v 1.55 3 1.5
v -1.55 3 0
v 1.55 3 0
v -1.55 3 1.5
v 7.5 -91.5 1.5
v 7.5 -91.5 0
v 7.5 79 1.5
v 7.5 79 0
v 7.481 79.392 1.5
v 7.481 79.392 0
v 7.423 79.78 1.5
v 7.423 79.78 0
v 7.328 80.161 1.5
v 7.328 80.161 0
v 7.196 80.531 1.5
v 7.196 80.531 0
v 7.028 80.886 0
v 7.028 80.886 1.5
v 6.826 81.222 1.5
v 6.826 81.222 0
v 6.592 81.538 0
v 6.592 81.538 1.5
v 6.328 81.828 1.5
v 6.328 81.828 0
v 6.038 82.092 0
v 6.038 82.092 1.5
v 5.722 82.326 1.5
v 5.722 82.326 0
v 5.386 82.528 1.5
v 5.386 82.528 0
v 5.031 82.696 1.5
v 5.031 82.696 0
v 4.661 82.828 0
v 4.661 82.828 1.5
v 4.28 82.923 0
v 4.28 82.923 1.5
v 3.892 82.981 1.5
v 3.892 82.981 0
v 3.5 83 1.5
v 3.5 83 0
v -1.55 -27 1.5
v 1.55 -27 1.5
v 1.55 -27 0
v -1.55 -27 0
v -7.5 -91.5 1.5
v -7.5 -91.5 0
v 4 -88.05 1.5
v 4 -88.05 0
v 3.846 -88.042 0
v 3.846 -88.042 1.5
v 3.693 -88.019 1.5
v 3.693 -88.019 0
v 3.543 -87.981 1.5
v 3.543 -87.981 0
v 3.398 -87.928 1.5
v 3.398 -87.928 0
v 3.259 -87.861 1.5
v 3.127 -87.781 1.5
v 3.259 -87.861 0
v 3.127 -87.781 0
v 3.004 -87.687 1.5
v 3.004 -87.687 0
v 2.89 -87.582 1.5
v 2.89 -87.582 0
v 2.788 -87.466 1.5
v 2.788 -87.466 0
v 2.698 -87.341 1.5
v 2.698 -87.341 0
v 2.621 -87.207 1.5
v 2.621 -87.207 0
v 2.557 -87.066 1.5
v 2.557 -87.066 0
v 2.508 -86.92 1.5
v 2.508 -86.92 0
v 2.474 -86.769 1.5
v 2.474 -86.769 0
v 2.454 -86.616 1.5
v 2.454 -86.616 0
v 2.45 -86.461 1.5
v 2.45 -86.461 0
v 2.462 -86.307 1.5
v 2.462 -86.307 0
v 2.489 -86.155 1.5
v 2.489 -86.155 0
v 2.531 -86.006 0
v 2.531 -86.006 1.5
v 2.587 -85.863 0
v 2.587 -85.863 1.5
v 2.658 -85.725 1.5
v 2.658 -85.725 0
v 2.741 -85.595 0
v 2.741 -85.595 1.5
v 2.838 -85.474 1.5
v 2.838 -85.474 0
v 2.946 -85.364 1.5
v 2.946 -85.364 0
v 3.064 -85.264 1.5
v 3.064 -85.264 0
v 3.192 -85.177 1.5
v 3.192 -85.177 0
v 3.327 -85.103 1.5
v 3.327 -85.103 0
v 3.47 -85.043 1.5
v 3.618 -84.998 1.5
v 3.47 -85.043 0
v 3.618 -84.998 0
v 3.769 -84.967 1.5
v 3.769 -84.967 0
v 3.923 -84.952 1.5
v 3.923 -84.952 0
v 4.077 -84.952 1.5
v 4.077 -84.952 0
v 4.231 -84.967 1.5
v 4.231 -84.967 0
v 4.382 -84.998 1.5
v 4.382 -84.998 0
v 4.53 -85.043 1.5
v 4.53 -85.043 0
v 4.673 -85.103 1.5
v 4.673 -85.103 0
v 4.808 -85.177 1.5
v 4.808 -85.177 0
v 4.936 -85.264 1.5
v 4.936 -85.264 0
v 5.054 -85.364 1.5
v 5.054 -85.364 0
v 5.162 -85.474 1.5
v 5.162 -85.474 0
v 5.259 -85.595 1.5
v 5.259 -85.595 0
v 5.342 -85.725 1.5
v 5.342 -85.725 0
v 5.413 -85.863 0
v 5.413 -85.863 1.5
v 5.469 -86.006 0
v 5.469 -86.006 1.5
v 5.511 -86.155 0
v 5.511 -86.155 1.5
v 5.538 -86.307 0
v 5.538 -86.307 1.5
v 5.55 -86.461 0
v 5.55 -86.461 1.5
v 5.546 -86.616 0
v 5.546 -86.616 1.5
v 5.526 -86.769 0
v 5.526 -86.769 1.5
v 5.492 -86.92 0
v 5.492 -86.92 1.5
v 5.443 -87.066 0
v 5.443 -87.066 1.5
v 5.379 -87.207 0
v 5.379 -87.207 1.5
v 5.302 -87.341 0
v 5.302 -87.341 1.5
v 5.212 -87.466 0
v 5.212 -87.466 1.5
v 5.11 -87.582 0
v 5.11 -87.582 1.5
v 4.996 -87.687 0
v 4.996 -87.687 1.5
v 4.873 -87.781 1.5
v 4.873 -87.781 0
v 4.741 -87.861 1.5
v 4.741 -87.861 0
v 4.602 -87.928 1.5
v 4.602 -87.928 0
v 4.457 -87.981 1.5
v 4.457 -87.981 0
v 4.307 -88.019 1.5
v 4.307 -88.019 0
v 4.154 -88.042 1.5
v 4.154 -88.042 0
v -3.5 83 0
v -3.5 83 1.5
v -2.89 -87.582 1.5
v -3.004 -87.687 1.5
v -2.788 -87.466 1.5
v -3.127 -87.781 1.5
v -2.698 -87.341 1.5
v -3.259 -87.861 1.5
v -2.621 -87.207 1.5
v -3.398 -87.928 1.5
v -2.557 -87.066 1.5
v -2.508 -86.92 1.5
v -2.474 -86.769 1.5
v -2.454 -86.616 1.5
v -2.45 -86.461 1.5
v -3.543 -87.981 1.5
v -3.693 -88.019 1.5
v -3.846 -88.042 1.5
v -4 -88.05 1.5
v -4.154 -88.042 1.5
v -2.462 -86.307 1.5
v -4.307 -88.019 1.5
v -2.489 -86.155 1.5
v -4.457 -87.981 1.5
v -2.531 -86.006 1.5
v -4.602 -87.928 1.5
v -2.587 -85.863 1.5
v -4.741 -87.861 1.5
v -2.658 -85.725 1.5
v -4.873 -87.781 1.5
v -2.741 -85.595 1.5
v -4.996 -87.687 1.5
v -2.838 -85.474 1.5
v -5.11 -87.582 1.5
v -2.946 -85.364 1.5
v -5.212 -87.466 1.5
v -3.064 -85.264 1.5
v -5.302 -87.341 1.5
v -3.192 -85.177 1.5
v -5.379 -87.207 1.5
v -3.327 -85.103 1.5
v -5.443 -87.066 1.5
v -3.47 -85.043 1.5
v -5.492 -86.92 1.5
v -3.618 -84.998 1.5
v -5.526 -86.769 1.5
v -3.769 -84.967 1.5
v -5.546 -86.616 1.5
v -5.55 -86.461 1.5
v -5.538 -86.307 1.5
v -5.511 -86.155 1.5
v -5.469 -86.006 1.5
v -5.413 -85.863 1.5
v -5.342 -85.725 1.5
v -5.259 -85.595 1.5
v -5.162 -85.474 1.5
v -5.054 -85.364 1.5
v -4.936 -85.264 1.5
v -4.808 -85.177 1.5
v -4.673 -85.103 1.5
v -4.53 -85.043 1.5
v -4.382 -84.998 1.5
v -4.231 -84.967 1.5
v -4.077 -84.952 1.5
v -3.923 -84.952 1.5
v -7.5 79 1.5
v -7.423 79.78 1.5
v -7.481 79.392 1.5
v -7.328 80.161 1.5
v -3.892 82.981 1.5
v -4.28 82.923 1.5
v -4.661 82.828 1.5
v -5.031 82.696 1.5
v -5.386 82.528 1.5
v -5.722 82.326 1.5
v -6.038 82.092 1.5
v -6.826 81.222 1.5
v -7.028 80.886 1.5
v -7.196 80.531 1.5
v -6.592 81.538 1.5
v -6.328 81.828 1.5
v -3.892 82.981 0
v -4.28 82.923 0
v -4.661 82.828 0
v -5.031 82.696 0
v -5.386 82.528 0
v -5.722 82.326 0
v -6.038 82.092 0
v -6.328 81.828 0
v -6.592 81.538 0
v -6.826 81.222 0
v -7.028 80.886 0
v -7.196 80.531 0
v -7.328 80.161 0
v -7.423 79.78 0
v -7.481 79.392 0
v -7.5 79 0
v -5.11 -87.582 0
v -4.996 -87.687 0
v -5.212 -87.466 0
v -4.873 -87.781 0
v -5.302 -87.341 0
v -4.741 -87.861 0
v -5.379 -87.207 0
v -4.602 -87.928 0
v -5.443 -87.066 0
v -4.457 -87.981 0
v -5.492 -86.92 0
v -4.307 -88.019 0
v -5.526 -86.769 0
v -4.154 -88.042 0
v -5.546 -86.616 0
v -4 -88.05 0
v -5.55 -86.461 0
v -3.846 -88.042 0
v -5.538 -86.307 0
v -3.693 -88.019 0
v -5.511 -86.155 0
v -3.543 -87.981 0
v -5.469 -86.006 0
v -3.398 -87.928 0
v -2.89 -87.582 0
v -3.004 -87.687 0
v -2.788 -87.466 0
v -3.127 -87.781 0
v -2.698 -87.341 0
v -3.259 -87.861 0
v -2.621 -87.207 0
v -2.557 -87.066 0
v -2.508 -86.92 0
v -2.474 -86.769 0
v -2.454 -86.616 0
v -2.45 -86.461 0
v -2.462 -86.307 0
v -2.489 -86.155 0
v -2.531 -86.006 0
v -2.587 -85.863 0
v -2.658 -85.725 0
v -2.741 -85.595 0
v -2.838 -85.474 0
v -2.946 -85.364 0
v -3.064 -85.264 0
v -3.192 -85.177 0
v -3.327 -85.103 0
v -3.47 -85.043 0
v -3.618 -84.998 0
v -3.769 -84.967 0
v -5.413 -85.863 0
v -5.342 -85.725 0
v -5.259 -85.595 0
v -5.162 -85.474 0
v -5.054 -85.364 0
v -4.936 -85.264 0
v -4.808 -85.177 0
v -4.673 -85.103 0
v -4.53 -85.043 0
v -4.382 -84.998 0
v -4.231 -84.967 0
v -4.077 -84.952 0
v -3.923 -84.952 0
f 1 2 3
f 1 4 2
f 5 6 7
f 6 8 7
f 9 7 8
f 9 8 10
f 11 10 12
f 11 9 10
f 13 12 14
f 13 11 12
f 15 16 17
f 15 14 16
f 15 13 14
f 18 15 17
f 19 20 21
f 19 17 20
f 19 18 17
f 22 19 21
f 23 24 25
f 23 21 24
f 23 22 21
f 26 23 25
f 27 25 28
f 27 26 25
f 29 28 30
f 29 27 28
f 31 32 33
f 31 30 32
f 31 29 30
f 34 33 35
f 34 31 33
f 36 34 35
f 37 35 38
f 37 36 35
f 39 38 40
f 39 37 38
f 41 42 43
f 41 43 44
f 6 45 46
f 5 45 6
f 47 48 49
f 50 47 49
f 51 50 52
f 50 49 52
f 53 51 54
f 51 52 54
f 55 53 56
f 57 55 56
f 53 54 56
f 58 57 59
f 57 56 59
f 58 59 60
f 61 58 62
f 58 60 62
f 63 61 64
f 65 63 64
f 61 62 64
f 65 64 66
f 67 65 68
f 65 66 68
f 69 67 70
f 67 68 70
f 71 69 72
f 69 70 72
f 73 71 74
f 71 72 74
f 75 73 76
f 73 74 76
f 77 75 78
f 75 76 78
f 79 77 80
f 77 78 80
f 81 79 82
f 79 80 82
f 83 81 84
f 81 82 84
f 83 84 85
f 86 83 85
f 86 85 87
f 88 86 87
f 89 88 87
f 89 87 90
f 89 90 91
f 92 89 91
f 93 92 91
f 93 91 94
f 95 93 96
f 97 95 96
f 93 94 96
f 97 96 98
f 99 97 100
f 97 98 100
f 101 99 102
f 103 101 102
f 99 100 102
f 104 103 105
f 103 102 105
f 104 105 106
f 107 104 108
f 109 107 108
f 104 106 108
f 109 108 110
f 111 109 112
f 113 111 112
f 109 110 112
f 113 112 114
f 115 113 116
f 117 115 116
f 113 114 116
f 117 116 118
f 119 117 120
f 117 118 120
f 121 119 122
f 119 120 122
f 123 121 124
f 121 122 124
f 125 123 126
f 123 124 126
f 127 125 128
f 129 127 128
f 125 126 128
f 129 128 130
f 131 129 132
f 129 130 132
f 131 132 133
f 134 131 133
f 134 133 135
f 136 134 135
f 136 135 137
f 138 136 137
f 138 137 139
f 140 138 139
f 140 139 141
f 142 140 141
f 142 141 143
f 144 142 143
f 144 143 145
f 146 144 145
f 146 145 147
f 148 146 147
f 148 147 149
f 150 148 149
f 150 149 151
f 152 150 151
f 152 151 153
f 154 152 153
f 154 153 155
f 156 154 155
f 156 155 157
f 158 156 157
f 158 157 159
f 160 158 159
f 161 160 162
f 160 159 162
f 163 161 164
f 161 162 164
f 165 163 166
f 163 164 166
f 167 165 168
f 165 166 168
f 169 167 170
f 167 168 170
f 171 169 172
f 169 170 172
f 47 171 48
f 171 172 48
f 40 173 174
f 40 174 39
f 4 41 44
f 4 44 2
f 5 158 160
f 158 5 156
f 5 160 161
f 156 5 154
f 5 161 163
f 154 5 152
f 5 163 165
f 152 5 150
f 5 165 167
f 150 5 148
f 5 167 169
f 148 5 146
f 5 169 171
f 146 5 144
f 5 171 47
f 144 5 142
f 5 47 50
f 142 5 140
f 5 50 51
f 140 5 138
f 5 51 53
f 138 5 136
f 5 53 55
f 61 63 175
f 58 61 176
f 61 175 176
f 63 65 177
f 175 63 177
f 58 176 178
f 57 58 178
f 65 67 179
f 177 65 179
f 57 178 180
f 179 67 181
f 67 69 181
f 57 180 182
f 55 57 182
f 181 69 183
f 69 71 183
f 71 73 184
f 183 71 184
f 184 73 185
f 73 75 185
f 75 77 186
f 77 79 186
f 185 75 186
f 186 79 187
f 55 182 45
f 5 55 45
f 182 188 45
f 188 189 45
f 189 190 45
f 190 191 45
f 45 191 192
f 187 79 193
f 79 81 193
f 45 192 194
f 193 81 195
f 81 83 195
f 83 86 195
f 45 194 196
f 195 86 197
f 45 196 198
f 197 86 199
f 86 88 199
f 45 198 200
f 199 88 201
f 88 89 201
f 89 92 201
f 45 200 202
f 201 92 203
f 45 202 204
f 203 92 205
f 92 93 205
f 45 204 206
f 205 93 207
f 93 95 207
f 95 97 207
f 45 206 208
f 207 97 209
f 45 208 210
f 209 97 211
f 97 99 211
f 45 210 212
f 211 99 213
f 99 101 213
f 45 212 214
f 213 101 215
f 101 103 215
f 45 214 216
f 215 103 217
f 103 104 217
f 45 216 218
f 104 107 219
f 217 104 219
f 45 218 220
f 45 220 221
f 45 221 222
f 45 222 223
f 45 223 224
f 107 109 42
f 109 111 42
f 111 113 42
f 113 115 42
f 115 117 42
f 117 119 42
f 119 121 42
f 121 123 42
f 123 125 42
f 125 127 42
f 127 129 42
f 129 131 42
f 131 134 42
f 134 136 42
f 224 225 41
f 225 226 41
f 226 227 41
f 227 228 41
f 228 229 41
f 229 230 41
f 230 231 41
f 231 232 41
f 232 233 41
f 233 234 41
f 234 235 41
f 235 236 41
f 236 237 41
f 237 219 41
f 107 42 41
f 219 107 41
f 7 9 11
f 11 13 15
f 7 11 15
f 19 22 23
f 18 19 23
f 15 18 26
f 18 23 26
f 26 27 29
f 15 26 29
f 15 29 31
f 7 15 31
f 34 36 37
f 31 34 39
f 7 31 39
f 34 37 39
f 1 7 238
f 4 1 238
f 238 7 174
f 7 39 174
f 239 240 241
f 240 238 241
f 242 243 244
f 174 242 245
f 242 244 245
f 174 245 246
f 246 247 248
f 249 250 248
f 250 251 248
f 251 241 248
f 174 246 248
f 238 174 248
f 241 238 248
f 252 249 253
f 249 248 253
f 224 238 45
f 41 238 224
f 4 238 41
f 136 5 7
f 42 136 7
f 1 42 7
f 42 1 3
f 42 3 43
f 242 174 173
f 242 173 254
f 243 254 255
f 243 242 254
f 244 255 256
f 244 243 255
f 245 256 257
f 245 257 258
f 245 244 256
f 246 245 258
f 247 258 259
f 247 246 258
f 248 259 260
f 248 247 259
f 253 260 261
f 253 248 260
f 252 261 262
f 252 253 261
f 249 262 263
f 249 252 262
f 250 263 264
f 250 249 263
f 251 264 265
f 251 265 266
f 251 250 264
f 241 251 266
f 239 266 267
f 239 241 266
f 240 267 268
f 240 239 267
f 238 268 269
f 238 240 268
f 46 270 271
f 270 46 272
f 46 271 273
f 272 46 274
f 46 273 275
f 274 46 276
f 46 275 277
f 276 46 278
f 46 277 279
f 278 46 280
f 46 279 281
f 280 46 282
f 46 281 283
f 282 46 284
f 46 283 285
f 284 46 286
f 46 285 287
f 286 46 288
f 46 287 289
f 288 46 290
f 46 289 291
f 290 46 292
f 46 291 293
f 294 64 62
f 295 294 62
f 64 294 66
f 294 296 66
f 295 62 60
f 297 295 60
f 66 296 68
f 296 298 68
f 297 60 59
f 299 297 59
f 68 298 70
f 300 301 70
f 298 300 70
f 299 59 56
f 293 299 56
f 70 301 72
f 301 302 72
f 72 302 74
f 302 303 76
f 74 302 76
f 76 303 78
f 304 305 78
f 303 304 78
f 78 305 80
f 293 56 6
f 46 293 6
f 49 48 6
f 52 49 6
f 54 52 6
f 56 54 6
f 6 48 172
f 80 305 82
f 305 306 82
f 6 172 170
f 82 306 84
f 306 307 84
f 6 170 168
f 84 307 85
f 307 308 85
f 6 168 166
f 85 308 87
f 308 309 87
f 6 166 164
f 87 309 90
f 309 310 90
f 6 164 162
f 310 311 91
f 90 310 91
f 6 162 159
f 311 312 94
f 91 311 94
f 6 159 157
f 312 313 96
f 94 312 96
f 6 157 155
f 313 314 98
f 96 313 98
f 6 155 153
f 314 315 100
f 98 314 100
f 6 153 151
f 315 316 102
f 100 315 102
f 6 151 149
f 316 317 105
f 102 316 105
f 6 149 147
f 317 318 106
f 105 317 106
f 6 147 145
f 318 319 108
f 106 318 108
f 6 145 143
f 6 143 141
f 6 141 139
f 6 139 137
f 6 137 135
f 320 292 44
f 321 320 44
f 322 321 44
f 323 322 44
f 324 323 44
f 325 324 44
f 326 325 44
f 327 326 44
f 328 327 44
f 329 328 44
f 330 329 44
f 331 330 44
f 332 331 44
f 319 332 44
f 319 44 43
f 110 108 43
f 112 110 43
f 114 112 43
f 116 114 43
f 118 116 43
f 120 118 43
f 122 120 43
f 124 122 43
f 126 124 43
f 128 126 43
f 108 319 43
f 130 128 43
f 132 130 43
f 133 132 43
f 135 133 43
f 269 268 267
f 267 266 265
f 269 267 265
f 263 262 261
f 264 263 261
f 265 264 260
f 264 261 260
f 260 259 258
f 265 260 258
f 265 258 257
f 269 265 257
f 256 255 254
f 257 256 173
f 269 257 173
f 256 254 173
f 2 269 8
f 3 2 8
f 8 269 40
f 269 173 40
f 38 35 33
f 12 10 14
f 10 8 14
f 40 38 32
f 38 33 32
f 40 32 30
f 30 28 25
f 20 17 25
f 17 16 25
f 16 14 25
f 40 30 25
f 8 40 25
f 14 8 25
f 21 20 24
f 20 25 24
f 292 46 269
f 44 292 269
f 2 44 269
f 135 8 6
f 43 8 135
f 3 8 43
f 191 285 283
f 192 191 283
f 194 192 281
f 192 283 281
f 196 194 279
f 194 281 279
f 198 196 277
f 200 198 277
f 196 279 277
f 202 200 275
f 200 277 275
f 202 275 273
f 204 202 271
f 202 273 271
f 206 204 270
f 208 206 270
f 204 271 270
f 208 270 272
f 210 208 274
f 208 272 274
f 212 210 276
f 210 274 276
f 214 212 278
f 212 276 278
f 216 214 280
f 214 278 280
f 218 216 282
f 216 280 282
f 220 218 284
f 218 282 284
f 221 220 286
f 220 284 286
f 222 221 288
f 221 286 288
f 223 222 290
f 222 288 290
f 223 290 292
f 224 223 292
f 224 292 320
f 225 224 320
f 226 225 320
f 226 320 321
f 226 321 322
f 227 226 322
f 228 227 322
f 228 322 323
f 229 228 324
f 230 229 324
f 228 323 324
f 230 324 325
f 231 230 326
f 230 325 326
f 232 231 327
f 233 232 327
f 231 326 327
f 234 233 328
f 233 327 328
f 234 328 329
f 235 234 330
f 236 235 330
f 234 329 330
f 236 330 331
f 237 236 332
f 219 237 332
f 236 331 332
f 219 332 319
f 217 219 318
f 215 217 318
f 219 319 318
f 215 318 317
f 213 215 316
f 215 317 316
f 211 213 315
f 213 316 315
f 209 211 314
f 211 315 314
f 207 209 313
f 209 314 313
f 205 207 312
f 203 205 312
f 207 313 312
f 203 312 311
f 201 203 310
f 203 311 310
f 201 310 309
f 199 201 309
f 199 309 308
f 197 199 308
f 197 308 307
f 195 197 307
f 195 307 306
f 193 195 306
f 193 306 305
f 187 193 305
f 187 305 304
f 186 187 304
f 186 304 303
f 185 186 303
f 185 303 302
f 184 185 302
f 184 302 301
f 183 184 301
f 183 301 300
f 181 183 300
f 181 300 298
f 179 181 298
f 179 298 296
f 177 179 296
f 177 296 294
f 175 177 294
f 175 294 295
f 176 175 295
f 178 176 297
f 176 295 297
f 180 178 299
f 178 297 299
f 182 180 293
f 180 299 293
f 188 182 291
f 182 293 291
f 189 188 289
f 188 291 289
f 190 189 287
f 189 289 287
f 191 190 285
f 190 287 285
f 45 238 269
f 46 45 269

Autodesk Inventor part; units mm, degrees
ref_plane "YZ Plane" through (0, 0, 0) normal (1, 0, 0) x (0, 1, 0)
ref_plane "XZ Plane" through (0, 0, 0) normal (0, 1, 0) x (-1, 0, 0)
ref_plane "XY Plane" through (0, 0, 0) normal (0, 0, 1) x (1, 0, 0)
sketch "スケッチ1" plane through (0, 0, 0) normal (0, 0, 1) x (1, 0, 0)
  line L0 (-7.5, 83) -> (7.5, 83)
  line L1 (7.5, 83) -> (7.5, -83)
  line L2 (7.5, -83) -> (-7.5, -83)
  line L3 (-7.5, -83) -> (-7.5, 83)
  line L4 (-7.5, 83) -> (7.5, -83) construction
  line L5 (7.5, 83) -> (-7.5, -83) construction
  point P0 (0, 0)
  dimension "d0" = 15
  dimension "d1" = 166
extrude "押し出し1" add sketch "スケッチ1" along normal blind 1.5
sketch "スケッチ2" plane through (0, 0, 1.5) normal (0, 0, 1) x (1, 0, 0)
  line L0 (7.5, 83) -> (-7.5, 83) projected
  line L1 (-1.55, 3) -> (1.55, 3)
  line L2 (1.55, 3) -> (1.55, -27)
  line L3 (1.55, -27) -> (-1.55, -27)
  line L4 (-1.55, -27) -> (-1.55, 3)
  line L5 (-7.5, 83) -> (-7.5, -83) projected
  point P0 (0, 0)
  dimension "d6" = 3.1
  dimension "d7" = 30
  dimension "d8" = 80
  dimension "d9" = 5.95
extrude "押し出し2" cut sketch "スケッチ2" against normal blind 1.5
fillet "フィレット1" radius 4 2 edges at (-7.5, 83, 0.75) (7.5, 83, 0.75)
sketch "スケッチ5" plane through (-7.5, -83, 0) normal (0, -1, 0) x (1, 0, 0)
  line L0 (0, 0) -> (15, 0)
  line L1 (15, 0) -> (15, 1.5)
  line L2 (15, 1.5) -> (0, 1.5)
  line L3 (0, 1.5) -> (0, 0)
  point P0 (7.5, 0)
extrude "押し出し4" add sketch "スケッチ5" along normal blind 8.5
sketch "スケッチ6" plane through (0, 0, 1.5) normal (0, 0, 1) x (1, 0, 0)
  line L0 (7.5, -91.5) -> (-7.5, -91.5) projected
  line L1 (-7.5, 79) -> (-7.5, -91.5) projected
  line L2 (7.5, 79) -> (7.5, -91.5) projected
  point P0 (0, 0)
  point P1 (-4, -86.5)
  point P2 (4, -86.5)
  dimension "d28" = 8
  dimension "d29" = 5
  dimension "d30" = 3.5
  dimension "d31" = 3.5
hole "穴2" at (-4, -86.5, 1.5) at (4, -86.5, 1.5) direction (0, 0, -1) diameter 3.1 end through all
properties part number "Fork 3 ver2c" material "アルミニウム 5052 H32"
